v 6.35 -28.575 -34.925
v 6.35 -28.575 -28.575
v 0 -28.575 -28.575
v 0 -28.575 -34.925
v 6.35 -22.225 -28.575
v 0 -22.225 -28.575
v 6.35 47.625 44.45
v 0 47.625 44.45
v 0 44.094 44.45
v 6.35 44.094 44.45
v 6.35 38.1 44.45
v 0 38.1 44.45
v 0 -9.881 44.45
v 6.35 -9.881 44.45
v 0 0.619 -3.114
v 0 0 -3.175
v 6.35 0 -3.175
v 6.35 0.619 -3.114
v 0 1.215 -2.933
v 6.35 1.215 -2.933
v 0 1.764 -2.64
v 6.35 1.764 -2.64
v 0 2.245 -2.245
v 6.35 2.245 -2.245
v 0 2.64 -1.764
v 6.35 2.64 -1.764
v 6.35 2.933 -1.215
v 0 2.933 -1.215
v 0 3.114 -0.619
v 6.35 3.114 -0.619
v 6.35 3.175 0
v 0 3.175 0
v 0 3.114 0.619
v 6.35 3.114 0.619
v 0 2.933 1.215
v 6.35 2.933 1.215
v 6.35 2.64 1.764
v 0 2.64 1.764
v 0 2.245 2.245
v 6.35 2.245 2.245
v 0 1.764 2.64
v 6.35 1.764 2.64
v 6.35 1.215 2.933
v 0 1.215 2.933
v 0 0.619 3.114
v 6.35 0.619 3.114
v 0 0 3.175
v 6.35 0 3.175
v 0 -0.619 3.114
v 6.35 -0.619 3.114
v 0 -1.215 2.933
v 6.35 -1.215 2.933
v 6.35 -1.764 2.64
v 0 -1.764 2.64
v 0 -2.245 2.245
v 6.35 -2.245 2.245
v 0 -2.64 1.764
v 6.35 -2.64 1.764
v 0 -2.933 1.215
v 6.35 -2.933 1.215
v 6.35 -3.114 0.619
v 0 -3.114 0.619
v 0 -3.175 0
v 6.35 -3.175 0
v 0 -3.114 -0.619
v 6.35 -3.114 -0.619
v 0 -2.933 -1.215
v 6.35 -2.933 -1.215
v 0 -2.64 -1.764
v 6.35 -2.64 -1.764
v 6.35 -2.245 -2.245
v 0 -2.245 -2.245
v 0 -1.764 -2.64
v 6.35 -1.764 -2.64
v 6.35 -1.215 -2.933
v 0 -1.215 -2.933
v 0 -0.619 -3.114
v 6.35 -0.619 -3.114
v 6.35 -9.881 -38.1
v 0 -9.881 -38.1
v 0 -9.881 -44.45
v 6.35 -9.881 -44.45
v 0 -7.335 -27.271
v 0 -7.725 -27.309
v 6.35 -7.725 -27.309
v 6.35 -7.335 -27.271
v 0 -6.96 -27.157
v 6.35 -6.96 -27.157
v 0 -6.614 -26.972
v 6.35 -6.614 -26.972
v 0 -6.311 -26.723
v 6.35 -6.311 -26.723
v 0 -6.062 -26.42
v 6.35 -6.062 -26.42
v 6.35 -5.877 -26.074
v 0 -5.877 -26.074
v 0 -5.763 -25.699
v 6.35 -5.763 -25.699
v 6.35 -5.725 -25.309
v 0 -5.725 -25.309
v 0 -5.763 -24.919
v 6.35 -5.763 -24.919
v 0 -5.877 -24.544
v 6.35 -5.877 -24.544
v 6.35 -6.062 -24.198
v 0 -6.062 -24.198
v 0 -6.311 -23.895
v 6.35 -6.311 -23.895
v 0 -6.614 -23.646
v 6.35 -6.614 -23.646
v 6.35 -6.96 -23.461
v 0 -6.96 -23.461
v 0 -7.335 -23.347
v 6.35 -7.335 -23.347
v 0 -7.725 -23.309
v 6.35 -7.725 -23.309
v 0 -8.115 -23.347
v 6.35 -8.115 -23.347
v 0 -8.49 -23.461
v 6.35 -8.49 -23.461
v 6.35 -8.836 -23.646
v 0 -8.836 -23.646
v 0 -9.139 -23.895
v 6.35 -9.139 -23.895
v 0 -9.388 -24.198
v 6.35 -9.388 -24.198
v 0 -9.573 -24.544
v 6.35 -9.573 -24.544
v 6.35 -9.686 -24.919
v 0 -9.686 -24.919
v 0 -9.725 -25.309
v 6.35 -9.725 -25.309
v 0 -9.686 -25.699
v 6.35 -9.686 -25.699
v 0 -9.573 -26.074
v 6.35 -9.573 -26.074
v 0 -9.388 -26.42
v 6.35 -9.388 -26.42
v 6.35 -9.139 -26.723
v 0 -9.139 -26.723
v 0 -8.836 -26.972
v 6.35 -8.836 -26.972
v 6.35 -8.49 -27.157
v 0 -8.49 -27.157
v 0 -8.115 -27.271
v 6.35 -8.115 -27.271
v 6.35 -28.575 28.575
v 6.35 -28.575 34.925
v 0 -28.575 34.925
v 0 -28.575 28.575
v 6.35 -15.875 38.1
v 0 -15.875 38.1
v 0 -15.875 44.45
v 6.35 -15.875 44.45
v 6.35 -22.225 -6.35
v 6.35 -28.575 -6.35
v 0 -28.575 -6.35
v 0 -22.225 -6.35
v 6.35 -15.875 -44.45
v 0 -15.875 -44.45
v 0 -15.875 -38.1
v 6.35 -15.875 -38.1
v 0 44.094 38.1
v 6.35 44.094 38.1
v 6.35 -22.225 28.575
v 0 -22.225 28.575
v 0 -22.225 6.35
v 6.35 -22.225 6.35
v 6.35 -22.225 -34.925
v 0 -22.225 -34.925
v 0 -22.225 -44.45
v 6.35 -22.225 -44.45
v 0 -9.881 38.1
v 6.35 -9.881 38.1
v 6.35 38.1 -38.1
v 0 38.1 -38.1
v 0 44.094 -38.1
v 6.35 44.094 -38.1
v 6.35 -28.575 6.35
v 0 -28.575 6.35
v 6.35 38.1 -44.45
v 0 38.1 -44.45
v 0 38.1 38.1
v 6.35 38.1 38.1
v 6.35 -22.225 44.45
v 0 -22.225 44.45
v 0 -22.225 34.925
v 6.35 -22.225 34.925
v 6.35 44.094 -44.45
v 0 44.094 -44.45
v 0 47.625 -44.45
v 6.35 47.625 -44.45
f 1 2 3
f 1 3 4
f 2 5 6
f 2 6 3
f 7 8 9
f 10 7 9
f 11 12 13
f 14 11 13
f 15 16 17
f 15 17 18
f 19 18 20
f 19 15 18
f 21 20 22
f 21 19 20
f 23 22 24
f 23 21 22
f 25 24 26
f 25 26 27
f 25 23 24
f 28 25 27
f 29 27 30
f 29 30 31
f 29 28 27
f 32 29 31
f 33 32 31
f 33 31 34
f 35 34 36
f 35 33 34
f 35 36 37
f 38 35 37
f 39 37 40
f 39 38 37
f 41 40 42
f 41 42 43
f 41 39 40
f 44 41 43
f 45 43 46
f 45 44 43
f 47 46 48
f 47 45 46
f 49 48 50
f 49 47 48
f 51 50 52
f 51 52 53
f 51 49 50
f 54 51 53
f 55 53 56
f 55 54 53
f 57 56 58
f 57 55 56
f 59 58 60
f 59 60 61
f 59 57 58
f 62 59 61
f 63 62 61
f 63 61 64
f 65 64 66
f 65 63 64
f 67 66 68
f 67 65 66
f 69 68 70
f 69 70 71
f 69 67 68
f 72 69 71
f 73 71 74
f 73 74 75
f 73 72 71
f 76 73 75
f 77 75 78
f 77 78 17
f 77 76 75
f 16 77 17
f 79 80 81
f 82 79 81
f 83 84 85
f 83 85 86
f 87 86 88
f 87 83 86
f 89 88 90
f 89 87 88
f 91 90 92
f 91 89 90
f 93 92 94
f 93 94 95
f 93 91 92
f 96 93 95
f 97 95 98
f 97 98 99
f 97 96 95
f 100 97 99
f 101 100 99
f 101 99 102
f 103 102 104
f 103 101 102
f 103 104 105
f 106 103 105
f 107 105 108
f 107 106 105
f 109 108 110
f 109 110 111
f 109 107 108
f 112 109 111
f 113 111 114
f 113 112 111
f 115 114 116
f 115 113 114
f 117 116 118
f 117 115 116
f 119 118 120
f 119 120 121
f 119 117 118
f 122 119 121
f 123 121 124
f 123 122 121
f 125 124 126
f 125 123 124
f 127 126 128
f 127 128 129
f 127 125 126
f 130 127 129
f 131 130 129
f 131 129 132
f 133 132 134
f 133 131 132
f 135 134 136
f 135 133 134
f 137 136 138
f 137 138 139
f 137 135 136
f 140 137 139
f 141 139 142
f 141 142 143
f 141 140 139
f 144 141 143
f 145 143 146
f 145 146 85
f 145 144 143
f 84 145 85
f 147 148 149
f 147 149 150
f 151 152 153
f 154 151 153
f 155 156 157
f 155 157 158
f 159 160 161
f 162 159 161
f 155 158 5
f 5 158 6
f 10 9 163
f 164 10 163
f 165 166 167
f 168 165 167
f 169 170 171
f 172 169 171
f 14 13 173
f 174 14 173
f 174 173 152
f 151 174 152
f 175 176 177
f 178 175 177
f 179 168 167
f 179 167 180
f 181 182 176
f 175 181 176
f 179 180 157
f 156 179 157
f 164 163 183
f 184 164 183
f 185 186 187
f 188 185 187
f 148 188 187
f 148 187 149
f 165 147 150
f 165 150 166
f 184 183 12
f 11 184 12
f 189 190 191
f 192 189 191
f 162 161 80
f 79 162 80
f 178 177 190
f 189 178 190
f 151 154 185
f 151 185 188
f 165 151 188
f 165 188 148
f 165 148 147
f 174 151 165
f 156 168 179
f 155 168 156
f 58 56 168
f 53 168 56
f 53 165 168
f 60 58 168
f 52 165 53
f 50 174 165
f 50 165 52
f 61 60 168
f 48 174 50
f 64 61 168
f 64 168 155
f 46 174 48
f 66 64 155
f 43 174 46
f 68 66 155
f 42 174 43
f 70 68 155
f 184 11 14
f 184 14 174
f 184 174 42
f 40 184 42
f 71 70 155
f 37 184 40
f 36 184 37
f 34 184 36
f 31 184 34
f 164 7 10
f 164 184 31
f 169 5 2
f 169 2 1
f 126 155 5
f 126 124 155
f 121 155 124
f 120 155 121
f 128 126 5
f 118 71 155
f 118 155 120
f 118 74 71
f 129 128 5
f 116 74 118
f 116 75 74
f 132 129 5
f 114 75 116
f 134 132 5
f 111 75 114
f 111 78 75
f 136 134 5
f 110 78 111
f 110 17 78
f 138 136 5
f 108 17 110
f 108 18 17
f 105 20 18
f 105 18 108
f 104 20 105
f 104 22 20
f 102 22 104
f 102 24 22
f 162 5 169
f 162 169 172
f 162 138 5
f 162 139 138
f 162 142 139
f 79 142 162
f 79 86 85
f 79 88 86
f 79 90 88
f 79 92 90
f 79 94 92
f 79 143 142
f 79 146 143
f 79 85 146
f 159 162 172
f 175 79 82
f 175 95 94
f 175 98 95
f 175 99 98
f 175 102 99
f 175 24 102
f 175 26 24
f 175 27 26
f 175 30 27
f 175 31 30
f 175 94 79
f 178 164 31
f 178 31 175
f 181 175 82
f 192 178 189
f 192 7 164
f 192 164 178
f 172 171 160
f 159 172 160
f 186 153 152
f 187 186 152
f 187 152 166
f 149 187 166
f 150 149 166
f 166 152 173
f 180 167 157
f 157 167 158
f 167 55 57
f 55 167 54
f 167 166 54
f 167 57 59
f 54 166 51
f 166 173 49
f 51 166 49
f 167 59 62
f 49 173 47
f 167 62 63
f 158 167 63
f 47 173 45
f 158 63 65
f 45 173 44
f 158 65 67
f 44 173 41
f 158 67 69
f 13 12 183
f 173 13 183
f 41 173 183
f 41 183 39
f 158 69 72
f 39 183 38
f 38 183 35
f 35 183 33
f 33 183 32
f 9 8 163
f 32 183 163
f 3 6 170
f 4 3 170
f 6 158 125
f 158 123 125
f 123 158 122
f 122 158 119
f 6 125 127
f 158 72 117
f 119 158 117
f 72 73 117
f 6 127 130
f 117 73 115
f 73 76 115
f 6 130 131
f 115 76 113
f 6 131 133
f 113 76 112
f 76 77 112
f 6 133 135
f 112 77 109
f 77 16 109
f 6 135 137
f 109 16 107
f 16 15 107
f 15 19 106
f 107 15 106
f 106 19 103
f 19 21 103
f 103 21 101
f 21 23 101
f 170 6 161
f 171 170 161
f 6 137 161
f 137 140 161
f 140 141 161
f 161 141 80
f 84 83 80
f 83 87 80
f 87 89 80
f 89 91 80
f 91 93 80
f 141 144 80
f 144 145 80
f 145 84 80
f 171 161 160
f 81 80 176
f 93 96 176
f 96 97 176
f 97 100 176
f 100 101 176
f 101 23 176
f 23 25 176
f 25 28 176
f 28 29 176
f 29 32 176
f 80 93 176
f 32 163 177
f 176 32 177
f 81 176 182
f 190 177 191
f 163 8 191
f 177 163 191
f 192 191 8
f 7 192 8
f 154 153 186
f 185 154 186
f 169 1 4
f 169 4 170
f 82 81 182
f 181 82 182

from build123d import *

# Parameters (mm, degrees)
SKETCH1_R           = 2
SKETCH1_R_2         = 3.175
BOSS_EXTRUDE1_DEPTH = 6.35


with BuildPart() as part:
    # Sketch1 → Boss-Extrude1 (new body)
    with BuildSketch(Plane(origin=(0, 0, 0), x_dir=(0, 0, -1), z_dir=(1, 0, 0))):
        Polygon((28.575, -22.225), (28.575, -28.575), (34.925, -28.575), (34.925, -22.225), (44.45, -22.225), (44.45, -15.875), (38.1, -15.875), (38.1, -9.8806), (44.45, -9.8806), (44.45, 38.1), (38.1, 38.1), (38.1, 44.0944), (44.45, 44.0944), (44.45, 47.625), (-44.45, 47.625), (-44.45, 44.0944), (-38.1, 44.0944), (-38.1, 38.1), (-44.45, 38.1), (-44.45, 22.225), (-44.45, -9.8806), (-38.1, -9.8806), (-38.1, -15.875), (-44.45, -15.875), (-44.45, -22.225), (-34.925, -22.225), (-34.925, -28.575), (-28.575, -28.575), (-28.575, -22.225), (-6.35, -22.225), (-6.35, -28.575), (6.35, -28.575), (6.35, -22.225), align=None)
        with Locations((25.309068, -7.724902)):
            Circle(SKETCH1_R, mode=Mode.SUBTRACT)
        Circle(SKETCH1_R_2, mode=Mode.SUBTRACT)
    extrude(amount=BOSS_EXTRUDE1_DEPTH)


solid = part.part
